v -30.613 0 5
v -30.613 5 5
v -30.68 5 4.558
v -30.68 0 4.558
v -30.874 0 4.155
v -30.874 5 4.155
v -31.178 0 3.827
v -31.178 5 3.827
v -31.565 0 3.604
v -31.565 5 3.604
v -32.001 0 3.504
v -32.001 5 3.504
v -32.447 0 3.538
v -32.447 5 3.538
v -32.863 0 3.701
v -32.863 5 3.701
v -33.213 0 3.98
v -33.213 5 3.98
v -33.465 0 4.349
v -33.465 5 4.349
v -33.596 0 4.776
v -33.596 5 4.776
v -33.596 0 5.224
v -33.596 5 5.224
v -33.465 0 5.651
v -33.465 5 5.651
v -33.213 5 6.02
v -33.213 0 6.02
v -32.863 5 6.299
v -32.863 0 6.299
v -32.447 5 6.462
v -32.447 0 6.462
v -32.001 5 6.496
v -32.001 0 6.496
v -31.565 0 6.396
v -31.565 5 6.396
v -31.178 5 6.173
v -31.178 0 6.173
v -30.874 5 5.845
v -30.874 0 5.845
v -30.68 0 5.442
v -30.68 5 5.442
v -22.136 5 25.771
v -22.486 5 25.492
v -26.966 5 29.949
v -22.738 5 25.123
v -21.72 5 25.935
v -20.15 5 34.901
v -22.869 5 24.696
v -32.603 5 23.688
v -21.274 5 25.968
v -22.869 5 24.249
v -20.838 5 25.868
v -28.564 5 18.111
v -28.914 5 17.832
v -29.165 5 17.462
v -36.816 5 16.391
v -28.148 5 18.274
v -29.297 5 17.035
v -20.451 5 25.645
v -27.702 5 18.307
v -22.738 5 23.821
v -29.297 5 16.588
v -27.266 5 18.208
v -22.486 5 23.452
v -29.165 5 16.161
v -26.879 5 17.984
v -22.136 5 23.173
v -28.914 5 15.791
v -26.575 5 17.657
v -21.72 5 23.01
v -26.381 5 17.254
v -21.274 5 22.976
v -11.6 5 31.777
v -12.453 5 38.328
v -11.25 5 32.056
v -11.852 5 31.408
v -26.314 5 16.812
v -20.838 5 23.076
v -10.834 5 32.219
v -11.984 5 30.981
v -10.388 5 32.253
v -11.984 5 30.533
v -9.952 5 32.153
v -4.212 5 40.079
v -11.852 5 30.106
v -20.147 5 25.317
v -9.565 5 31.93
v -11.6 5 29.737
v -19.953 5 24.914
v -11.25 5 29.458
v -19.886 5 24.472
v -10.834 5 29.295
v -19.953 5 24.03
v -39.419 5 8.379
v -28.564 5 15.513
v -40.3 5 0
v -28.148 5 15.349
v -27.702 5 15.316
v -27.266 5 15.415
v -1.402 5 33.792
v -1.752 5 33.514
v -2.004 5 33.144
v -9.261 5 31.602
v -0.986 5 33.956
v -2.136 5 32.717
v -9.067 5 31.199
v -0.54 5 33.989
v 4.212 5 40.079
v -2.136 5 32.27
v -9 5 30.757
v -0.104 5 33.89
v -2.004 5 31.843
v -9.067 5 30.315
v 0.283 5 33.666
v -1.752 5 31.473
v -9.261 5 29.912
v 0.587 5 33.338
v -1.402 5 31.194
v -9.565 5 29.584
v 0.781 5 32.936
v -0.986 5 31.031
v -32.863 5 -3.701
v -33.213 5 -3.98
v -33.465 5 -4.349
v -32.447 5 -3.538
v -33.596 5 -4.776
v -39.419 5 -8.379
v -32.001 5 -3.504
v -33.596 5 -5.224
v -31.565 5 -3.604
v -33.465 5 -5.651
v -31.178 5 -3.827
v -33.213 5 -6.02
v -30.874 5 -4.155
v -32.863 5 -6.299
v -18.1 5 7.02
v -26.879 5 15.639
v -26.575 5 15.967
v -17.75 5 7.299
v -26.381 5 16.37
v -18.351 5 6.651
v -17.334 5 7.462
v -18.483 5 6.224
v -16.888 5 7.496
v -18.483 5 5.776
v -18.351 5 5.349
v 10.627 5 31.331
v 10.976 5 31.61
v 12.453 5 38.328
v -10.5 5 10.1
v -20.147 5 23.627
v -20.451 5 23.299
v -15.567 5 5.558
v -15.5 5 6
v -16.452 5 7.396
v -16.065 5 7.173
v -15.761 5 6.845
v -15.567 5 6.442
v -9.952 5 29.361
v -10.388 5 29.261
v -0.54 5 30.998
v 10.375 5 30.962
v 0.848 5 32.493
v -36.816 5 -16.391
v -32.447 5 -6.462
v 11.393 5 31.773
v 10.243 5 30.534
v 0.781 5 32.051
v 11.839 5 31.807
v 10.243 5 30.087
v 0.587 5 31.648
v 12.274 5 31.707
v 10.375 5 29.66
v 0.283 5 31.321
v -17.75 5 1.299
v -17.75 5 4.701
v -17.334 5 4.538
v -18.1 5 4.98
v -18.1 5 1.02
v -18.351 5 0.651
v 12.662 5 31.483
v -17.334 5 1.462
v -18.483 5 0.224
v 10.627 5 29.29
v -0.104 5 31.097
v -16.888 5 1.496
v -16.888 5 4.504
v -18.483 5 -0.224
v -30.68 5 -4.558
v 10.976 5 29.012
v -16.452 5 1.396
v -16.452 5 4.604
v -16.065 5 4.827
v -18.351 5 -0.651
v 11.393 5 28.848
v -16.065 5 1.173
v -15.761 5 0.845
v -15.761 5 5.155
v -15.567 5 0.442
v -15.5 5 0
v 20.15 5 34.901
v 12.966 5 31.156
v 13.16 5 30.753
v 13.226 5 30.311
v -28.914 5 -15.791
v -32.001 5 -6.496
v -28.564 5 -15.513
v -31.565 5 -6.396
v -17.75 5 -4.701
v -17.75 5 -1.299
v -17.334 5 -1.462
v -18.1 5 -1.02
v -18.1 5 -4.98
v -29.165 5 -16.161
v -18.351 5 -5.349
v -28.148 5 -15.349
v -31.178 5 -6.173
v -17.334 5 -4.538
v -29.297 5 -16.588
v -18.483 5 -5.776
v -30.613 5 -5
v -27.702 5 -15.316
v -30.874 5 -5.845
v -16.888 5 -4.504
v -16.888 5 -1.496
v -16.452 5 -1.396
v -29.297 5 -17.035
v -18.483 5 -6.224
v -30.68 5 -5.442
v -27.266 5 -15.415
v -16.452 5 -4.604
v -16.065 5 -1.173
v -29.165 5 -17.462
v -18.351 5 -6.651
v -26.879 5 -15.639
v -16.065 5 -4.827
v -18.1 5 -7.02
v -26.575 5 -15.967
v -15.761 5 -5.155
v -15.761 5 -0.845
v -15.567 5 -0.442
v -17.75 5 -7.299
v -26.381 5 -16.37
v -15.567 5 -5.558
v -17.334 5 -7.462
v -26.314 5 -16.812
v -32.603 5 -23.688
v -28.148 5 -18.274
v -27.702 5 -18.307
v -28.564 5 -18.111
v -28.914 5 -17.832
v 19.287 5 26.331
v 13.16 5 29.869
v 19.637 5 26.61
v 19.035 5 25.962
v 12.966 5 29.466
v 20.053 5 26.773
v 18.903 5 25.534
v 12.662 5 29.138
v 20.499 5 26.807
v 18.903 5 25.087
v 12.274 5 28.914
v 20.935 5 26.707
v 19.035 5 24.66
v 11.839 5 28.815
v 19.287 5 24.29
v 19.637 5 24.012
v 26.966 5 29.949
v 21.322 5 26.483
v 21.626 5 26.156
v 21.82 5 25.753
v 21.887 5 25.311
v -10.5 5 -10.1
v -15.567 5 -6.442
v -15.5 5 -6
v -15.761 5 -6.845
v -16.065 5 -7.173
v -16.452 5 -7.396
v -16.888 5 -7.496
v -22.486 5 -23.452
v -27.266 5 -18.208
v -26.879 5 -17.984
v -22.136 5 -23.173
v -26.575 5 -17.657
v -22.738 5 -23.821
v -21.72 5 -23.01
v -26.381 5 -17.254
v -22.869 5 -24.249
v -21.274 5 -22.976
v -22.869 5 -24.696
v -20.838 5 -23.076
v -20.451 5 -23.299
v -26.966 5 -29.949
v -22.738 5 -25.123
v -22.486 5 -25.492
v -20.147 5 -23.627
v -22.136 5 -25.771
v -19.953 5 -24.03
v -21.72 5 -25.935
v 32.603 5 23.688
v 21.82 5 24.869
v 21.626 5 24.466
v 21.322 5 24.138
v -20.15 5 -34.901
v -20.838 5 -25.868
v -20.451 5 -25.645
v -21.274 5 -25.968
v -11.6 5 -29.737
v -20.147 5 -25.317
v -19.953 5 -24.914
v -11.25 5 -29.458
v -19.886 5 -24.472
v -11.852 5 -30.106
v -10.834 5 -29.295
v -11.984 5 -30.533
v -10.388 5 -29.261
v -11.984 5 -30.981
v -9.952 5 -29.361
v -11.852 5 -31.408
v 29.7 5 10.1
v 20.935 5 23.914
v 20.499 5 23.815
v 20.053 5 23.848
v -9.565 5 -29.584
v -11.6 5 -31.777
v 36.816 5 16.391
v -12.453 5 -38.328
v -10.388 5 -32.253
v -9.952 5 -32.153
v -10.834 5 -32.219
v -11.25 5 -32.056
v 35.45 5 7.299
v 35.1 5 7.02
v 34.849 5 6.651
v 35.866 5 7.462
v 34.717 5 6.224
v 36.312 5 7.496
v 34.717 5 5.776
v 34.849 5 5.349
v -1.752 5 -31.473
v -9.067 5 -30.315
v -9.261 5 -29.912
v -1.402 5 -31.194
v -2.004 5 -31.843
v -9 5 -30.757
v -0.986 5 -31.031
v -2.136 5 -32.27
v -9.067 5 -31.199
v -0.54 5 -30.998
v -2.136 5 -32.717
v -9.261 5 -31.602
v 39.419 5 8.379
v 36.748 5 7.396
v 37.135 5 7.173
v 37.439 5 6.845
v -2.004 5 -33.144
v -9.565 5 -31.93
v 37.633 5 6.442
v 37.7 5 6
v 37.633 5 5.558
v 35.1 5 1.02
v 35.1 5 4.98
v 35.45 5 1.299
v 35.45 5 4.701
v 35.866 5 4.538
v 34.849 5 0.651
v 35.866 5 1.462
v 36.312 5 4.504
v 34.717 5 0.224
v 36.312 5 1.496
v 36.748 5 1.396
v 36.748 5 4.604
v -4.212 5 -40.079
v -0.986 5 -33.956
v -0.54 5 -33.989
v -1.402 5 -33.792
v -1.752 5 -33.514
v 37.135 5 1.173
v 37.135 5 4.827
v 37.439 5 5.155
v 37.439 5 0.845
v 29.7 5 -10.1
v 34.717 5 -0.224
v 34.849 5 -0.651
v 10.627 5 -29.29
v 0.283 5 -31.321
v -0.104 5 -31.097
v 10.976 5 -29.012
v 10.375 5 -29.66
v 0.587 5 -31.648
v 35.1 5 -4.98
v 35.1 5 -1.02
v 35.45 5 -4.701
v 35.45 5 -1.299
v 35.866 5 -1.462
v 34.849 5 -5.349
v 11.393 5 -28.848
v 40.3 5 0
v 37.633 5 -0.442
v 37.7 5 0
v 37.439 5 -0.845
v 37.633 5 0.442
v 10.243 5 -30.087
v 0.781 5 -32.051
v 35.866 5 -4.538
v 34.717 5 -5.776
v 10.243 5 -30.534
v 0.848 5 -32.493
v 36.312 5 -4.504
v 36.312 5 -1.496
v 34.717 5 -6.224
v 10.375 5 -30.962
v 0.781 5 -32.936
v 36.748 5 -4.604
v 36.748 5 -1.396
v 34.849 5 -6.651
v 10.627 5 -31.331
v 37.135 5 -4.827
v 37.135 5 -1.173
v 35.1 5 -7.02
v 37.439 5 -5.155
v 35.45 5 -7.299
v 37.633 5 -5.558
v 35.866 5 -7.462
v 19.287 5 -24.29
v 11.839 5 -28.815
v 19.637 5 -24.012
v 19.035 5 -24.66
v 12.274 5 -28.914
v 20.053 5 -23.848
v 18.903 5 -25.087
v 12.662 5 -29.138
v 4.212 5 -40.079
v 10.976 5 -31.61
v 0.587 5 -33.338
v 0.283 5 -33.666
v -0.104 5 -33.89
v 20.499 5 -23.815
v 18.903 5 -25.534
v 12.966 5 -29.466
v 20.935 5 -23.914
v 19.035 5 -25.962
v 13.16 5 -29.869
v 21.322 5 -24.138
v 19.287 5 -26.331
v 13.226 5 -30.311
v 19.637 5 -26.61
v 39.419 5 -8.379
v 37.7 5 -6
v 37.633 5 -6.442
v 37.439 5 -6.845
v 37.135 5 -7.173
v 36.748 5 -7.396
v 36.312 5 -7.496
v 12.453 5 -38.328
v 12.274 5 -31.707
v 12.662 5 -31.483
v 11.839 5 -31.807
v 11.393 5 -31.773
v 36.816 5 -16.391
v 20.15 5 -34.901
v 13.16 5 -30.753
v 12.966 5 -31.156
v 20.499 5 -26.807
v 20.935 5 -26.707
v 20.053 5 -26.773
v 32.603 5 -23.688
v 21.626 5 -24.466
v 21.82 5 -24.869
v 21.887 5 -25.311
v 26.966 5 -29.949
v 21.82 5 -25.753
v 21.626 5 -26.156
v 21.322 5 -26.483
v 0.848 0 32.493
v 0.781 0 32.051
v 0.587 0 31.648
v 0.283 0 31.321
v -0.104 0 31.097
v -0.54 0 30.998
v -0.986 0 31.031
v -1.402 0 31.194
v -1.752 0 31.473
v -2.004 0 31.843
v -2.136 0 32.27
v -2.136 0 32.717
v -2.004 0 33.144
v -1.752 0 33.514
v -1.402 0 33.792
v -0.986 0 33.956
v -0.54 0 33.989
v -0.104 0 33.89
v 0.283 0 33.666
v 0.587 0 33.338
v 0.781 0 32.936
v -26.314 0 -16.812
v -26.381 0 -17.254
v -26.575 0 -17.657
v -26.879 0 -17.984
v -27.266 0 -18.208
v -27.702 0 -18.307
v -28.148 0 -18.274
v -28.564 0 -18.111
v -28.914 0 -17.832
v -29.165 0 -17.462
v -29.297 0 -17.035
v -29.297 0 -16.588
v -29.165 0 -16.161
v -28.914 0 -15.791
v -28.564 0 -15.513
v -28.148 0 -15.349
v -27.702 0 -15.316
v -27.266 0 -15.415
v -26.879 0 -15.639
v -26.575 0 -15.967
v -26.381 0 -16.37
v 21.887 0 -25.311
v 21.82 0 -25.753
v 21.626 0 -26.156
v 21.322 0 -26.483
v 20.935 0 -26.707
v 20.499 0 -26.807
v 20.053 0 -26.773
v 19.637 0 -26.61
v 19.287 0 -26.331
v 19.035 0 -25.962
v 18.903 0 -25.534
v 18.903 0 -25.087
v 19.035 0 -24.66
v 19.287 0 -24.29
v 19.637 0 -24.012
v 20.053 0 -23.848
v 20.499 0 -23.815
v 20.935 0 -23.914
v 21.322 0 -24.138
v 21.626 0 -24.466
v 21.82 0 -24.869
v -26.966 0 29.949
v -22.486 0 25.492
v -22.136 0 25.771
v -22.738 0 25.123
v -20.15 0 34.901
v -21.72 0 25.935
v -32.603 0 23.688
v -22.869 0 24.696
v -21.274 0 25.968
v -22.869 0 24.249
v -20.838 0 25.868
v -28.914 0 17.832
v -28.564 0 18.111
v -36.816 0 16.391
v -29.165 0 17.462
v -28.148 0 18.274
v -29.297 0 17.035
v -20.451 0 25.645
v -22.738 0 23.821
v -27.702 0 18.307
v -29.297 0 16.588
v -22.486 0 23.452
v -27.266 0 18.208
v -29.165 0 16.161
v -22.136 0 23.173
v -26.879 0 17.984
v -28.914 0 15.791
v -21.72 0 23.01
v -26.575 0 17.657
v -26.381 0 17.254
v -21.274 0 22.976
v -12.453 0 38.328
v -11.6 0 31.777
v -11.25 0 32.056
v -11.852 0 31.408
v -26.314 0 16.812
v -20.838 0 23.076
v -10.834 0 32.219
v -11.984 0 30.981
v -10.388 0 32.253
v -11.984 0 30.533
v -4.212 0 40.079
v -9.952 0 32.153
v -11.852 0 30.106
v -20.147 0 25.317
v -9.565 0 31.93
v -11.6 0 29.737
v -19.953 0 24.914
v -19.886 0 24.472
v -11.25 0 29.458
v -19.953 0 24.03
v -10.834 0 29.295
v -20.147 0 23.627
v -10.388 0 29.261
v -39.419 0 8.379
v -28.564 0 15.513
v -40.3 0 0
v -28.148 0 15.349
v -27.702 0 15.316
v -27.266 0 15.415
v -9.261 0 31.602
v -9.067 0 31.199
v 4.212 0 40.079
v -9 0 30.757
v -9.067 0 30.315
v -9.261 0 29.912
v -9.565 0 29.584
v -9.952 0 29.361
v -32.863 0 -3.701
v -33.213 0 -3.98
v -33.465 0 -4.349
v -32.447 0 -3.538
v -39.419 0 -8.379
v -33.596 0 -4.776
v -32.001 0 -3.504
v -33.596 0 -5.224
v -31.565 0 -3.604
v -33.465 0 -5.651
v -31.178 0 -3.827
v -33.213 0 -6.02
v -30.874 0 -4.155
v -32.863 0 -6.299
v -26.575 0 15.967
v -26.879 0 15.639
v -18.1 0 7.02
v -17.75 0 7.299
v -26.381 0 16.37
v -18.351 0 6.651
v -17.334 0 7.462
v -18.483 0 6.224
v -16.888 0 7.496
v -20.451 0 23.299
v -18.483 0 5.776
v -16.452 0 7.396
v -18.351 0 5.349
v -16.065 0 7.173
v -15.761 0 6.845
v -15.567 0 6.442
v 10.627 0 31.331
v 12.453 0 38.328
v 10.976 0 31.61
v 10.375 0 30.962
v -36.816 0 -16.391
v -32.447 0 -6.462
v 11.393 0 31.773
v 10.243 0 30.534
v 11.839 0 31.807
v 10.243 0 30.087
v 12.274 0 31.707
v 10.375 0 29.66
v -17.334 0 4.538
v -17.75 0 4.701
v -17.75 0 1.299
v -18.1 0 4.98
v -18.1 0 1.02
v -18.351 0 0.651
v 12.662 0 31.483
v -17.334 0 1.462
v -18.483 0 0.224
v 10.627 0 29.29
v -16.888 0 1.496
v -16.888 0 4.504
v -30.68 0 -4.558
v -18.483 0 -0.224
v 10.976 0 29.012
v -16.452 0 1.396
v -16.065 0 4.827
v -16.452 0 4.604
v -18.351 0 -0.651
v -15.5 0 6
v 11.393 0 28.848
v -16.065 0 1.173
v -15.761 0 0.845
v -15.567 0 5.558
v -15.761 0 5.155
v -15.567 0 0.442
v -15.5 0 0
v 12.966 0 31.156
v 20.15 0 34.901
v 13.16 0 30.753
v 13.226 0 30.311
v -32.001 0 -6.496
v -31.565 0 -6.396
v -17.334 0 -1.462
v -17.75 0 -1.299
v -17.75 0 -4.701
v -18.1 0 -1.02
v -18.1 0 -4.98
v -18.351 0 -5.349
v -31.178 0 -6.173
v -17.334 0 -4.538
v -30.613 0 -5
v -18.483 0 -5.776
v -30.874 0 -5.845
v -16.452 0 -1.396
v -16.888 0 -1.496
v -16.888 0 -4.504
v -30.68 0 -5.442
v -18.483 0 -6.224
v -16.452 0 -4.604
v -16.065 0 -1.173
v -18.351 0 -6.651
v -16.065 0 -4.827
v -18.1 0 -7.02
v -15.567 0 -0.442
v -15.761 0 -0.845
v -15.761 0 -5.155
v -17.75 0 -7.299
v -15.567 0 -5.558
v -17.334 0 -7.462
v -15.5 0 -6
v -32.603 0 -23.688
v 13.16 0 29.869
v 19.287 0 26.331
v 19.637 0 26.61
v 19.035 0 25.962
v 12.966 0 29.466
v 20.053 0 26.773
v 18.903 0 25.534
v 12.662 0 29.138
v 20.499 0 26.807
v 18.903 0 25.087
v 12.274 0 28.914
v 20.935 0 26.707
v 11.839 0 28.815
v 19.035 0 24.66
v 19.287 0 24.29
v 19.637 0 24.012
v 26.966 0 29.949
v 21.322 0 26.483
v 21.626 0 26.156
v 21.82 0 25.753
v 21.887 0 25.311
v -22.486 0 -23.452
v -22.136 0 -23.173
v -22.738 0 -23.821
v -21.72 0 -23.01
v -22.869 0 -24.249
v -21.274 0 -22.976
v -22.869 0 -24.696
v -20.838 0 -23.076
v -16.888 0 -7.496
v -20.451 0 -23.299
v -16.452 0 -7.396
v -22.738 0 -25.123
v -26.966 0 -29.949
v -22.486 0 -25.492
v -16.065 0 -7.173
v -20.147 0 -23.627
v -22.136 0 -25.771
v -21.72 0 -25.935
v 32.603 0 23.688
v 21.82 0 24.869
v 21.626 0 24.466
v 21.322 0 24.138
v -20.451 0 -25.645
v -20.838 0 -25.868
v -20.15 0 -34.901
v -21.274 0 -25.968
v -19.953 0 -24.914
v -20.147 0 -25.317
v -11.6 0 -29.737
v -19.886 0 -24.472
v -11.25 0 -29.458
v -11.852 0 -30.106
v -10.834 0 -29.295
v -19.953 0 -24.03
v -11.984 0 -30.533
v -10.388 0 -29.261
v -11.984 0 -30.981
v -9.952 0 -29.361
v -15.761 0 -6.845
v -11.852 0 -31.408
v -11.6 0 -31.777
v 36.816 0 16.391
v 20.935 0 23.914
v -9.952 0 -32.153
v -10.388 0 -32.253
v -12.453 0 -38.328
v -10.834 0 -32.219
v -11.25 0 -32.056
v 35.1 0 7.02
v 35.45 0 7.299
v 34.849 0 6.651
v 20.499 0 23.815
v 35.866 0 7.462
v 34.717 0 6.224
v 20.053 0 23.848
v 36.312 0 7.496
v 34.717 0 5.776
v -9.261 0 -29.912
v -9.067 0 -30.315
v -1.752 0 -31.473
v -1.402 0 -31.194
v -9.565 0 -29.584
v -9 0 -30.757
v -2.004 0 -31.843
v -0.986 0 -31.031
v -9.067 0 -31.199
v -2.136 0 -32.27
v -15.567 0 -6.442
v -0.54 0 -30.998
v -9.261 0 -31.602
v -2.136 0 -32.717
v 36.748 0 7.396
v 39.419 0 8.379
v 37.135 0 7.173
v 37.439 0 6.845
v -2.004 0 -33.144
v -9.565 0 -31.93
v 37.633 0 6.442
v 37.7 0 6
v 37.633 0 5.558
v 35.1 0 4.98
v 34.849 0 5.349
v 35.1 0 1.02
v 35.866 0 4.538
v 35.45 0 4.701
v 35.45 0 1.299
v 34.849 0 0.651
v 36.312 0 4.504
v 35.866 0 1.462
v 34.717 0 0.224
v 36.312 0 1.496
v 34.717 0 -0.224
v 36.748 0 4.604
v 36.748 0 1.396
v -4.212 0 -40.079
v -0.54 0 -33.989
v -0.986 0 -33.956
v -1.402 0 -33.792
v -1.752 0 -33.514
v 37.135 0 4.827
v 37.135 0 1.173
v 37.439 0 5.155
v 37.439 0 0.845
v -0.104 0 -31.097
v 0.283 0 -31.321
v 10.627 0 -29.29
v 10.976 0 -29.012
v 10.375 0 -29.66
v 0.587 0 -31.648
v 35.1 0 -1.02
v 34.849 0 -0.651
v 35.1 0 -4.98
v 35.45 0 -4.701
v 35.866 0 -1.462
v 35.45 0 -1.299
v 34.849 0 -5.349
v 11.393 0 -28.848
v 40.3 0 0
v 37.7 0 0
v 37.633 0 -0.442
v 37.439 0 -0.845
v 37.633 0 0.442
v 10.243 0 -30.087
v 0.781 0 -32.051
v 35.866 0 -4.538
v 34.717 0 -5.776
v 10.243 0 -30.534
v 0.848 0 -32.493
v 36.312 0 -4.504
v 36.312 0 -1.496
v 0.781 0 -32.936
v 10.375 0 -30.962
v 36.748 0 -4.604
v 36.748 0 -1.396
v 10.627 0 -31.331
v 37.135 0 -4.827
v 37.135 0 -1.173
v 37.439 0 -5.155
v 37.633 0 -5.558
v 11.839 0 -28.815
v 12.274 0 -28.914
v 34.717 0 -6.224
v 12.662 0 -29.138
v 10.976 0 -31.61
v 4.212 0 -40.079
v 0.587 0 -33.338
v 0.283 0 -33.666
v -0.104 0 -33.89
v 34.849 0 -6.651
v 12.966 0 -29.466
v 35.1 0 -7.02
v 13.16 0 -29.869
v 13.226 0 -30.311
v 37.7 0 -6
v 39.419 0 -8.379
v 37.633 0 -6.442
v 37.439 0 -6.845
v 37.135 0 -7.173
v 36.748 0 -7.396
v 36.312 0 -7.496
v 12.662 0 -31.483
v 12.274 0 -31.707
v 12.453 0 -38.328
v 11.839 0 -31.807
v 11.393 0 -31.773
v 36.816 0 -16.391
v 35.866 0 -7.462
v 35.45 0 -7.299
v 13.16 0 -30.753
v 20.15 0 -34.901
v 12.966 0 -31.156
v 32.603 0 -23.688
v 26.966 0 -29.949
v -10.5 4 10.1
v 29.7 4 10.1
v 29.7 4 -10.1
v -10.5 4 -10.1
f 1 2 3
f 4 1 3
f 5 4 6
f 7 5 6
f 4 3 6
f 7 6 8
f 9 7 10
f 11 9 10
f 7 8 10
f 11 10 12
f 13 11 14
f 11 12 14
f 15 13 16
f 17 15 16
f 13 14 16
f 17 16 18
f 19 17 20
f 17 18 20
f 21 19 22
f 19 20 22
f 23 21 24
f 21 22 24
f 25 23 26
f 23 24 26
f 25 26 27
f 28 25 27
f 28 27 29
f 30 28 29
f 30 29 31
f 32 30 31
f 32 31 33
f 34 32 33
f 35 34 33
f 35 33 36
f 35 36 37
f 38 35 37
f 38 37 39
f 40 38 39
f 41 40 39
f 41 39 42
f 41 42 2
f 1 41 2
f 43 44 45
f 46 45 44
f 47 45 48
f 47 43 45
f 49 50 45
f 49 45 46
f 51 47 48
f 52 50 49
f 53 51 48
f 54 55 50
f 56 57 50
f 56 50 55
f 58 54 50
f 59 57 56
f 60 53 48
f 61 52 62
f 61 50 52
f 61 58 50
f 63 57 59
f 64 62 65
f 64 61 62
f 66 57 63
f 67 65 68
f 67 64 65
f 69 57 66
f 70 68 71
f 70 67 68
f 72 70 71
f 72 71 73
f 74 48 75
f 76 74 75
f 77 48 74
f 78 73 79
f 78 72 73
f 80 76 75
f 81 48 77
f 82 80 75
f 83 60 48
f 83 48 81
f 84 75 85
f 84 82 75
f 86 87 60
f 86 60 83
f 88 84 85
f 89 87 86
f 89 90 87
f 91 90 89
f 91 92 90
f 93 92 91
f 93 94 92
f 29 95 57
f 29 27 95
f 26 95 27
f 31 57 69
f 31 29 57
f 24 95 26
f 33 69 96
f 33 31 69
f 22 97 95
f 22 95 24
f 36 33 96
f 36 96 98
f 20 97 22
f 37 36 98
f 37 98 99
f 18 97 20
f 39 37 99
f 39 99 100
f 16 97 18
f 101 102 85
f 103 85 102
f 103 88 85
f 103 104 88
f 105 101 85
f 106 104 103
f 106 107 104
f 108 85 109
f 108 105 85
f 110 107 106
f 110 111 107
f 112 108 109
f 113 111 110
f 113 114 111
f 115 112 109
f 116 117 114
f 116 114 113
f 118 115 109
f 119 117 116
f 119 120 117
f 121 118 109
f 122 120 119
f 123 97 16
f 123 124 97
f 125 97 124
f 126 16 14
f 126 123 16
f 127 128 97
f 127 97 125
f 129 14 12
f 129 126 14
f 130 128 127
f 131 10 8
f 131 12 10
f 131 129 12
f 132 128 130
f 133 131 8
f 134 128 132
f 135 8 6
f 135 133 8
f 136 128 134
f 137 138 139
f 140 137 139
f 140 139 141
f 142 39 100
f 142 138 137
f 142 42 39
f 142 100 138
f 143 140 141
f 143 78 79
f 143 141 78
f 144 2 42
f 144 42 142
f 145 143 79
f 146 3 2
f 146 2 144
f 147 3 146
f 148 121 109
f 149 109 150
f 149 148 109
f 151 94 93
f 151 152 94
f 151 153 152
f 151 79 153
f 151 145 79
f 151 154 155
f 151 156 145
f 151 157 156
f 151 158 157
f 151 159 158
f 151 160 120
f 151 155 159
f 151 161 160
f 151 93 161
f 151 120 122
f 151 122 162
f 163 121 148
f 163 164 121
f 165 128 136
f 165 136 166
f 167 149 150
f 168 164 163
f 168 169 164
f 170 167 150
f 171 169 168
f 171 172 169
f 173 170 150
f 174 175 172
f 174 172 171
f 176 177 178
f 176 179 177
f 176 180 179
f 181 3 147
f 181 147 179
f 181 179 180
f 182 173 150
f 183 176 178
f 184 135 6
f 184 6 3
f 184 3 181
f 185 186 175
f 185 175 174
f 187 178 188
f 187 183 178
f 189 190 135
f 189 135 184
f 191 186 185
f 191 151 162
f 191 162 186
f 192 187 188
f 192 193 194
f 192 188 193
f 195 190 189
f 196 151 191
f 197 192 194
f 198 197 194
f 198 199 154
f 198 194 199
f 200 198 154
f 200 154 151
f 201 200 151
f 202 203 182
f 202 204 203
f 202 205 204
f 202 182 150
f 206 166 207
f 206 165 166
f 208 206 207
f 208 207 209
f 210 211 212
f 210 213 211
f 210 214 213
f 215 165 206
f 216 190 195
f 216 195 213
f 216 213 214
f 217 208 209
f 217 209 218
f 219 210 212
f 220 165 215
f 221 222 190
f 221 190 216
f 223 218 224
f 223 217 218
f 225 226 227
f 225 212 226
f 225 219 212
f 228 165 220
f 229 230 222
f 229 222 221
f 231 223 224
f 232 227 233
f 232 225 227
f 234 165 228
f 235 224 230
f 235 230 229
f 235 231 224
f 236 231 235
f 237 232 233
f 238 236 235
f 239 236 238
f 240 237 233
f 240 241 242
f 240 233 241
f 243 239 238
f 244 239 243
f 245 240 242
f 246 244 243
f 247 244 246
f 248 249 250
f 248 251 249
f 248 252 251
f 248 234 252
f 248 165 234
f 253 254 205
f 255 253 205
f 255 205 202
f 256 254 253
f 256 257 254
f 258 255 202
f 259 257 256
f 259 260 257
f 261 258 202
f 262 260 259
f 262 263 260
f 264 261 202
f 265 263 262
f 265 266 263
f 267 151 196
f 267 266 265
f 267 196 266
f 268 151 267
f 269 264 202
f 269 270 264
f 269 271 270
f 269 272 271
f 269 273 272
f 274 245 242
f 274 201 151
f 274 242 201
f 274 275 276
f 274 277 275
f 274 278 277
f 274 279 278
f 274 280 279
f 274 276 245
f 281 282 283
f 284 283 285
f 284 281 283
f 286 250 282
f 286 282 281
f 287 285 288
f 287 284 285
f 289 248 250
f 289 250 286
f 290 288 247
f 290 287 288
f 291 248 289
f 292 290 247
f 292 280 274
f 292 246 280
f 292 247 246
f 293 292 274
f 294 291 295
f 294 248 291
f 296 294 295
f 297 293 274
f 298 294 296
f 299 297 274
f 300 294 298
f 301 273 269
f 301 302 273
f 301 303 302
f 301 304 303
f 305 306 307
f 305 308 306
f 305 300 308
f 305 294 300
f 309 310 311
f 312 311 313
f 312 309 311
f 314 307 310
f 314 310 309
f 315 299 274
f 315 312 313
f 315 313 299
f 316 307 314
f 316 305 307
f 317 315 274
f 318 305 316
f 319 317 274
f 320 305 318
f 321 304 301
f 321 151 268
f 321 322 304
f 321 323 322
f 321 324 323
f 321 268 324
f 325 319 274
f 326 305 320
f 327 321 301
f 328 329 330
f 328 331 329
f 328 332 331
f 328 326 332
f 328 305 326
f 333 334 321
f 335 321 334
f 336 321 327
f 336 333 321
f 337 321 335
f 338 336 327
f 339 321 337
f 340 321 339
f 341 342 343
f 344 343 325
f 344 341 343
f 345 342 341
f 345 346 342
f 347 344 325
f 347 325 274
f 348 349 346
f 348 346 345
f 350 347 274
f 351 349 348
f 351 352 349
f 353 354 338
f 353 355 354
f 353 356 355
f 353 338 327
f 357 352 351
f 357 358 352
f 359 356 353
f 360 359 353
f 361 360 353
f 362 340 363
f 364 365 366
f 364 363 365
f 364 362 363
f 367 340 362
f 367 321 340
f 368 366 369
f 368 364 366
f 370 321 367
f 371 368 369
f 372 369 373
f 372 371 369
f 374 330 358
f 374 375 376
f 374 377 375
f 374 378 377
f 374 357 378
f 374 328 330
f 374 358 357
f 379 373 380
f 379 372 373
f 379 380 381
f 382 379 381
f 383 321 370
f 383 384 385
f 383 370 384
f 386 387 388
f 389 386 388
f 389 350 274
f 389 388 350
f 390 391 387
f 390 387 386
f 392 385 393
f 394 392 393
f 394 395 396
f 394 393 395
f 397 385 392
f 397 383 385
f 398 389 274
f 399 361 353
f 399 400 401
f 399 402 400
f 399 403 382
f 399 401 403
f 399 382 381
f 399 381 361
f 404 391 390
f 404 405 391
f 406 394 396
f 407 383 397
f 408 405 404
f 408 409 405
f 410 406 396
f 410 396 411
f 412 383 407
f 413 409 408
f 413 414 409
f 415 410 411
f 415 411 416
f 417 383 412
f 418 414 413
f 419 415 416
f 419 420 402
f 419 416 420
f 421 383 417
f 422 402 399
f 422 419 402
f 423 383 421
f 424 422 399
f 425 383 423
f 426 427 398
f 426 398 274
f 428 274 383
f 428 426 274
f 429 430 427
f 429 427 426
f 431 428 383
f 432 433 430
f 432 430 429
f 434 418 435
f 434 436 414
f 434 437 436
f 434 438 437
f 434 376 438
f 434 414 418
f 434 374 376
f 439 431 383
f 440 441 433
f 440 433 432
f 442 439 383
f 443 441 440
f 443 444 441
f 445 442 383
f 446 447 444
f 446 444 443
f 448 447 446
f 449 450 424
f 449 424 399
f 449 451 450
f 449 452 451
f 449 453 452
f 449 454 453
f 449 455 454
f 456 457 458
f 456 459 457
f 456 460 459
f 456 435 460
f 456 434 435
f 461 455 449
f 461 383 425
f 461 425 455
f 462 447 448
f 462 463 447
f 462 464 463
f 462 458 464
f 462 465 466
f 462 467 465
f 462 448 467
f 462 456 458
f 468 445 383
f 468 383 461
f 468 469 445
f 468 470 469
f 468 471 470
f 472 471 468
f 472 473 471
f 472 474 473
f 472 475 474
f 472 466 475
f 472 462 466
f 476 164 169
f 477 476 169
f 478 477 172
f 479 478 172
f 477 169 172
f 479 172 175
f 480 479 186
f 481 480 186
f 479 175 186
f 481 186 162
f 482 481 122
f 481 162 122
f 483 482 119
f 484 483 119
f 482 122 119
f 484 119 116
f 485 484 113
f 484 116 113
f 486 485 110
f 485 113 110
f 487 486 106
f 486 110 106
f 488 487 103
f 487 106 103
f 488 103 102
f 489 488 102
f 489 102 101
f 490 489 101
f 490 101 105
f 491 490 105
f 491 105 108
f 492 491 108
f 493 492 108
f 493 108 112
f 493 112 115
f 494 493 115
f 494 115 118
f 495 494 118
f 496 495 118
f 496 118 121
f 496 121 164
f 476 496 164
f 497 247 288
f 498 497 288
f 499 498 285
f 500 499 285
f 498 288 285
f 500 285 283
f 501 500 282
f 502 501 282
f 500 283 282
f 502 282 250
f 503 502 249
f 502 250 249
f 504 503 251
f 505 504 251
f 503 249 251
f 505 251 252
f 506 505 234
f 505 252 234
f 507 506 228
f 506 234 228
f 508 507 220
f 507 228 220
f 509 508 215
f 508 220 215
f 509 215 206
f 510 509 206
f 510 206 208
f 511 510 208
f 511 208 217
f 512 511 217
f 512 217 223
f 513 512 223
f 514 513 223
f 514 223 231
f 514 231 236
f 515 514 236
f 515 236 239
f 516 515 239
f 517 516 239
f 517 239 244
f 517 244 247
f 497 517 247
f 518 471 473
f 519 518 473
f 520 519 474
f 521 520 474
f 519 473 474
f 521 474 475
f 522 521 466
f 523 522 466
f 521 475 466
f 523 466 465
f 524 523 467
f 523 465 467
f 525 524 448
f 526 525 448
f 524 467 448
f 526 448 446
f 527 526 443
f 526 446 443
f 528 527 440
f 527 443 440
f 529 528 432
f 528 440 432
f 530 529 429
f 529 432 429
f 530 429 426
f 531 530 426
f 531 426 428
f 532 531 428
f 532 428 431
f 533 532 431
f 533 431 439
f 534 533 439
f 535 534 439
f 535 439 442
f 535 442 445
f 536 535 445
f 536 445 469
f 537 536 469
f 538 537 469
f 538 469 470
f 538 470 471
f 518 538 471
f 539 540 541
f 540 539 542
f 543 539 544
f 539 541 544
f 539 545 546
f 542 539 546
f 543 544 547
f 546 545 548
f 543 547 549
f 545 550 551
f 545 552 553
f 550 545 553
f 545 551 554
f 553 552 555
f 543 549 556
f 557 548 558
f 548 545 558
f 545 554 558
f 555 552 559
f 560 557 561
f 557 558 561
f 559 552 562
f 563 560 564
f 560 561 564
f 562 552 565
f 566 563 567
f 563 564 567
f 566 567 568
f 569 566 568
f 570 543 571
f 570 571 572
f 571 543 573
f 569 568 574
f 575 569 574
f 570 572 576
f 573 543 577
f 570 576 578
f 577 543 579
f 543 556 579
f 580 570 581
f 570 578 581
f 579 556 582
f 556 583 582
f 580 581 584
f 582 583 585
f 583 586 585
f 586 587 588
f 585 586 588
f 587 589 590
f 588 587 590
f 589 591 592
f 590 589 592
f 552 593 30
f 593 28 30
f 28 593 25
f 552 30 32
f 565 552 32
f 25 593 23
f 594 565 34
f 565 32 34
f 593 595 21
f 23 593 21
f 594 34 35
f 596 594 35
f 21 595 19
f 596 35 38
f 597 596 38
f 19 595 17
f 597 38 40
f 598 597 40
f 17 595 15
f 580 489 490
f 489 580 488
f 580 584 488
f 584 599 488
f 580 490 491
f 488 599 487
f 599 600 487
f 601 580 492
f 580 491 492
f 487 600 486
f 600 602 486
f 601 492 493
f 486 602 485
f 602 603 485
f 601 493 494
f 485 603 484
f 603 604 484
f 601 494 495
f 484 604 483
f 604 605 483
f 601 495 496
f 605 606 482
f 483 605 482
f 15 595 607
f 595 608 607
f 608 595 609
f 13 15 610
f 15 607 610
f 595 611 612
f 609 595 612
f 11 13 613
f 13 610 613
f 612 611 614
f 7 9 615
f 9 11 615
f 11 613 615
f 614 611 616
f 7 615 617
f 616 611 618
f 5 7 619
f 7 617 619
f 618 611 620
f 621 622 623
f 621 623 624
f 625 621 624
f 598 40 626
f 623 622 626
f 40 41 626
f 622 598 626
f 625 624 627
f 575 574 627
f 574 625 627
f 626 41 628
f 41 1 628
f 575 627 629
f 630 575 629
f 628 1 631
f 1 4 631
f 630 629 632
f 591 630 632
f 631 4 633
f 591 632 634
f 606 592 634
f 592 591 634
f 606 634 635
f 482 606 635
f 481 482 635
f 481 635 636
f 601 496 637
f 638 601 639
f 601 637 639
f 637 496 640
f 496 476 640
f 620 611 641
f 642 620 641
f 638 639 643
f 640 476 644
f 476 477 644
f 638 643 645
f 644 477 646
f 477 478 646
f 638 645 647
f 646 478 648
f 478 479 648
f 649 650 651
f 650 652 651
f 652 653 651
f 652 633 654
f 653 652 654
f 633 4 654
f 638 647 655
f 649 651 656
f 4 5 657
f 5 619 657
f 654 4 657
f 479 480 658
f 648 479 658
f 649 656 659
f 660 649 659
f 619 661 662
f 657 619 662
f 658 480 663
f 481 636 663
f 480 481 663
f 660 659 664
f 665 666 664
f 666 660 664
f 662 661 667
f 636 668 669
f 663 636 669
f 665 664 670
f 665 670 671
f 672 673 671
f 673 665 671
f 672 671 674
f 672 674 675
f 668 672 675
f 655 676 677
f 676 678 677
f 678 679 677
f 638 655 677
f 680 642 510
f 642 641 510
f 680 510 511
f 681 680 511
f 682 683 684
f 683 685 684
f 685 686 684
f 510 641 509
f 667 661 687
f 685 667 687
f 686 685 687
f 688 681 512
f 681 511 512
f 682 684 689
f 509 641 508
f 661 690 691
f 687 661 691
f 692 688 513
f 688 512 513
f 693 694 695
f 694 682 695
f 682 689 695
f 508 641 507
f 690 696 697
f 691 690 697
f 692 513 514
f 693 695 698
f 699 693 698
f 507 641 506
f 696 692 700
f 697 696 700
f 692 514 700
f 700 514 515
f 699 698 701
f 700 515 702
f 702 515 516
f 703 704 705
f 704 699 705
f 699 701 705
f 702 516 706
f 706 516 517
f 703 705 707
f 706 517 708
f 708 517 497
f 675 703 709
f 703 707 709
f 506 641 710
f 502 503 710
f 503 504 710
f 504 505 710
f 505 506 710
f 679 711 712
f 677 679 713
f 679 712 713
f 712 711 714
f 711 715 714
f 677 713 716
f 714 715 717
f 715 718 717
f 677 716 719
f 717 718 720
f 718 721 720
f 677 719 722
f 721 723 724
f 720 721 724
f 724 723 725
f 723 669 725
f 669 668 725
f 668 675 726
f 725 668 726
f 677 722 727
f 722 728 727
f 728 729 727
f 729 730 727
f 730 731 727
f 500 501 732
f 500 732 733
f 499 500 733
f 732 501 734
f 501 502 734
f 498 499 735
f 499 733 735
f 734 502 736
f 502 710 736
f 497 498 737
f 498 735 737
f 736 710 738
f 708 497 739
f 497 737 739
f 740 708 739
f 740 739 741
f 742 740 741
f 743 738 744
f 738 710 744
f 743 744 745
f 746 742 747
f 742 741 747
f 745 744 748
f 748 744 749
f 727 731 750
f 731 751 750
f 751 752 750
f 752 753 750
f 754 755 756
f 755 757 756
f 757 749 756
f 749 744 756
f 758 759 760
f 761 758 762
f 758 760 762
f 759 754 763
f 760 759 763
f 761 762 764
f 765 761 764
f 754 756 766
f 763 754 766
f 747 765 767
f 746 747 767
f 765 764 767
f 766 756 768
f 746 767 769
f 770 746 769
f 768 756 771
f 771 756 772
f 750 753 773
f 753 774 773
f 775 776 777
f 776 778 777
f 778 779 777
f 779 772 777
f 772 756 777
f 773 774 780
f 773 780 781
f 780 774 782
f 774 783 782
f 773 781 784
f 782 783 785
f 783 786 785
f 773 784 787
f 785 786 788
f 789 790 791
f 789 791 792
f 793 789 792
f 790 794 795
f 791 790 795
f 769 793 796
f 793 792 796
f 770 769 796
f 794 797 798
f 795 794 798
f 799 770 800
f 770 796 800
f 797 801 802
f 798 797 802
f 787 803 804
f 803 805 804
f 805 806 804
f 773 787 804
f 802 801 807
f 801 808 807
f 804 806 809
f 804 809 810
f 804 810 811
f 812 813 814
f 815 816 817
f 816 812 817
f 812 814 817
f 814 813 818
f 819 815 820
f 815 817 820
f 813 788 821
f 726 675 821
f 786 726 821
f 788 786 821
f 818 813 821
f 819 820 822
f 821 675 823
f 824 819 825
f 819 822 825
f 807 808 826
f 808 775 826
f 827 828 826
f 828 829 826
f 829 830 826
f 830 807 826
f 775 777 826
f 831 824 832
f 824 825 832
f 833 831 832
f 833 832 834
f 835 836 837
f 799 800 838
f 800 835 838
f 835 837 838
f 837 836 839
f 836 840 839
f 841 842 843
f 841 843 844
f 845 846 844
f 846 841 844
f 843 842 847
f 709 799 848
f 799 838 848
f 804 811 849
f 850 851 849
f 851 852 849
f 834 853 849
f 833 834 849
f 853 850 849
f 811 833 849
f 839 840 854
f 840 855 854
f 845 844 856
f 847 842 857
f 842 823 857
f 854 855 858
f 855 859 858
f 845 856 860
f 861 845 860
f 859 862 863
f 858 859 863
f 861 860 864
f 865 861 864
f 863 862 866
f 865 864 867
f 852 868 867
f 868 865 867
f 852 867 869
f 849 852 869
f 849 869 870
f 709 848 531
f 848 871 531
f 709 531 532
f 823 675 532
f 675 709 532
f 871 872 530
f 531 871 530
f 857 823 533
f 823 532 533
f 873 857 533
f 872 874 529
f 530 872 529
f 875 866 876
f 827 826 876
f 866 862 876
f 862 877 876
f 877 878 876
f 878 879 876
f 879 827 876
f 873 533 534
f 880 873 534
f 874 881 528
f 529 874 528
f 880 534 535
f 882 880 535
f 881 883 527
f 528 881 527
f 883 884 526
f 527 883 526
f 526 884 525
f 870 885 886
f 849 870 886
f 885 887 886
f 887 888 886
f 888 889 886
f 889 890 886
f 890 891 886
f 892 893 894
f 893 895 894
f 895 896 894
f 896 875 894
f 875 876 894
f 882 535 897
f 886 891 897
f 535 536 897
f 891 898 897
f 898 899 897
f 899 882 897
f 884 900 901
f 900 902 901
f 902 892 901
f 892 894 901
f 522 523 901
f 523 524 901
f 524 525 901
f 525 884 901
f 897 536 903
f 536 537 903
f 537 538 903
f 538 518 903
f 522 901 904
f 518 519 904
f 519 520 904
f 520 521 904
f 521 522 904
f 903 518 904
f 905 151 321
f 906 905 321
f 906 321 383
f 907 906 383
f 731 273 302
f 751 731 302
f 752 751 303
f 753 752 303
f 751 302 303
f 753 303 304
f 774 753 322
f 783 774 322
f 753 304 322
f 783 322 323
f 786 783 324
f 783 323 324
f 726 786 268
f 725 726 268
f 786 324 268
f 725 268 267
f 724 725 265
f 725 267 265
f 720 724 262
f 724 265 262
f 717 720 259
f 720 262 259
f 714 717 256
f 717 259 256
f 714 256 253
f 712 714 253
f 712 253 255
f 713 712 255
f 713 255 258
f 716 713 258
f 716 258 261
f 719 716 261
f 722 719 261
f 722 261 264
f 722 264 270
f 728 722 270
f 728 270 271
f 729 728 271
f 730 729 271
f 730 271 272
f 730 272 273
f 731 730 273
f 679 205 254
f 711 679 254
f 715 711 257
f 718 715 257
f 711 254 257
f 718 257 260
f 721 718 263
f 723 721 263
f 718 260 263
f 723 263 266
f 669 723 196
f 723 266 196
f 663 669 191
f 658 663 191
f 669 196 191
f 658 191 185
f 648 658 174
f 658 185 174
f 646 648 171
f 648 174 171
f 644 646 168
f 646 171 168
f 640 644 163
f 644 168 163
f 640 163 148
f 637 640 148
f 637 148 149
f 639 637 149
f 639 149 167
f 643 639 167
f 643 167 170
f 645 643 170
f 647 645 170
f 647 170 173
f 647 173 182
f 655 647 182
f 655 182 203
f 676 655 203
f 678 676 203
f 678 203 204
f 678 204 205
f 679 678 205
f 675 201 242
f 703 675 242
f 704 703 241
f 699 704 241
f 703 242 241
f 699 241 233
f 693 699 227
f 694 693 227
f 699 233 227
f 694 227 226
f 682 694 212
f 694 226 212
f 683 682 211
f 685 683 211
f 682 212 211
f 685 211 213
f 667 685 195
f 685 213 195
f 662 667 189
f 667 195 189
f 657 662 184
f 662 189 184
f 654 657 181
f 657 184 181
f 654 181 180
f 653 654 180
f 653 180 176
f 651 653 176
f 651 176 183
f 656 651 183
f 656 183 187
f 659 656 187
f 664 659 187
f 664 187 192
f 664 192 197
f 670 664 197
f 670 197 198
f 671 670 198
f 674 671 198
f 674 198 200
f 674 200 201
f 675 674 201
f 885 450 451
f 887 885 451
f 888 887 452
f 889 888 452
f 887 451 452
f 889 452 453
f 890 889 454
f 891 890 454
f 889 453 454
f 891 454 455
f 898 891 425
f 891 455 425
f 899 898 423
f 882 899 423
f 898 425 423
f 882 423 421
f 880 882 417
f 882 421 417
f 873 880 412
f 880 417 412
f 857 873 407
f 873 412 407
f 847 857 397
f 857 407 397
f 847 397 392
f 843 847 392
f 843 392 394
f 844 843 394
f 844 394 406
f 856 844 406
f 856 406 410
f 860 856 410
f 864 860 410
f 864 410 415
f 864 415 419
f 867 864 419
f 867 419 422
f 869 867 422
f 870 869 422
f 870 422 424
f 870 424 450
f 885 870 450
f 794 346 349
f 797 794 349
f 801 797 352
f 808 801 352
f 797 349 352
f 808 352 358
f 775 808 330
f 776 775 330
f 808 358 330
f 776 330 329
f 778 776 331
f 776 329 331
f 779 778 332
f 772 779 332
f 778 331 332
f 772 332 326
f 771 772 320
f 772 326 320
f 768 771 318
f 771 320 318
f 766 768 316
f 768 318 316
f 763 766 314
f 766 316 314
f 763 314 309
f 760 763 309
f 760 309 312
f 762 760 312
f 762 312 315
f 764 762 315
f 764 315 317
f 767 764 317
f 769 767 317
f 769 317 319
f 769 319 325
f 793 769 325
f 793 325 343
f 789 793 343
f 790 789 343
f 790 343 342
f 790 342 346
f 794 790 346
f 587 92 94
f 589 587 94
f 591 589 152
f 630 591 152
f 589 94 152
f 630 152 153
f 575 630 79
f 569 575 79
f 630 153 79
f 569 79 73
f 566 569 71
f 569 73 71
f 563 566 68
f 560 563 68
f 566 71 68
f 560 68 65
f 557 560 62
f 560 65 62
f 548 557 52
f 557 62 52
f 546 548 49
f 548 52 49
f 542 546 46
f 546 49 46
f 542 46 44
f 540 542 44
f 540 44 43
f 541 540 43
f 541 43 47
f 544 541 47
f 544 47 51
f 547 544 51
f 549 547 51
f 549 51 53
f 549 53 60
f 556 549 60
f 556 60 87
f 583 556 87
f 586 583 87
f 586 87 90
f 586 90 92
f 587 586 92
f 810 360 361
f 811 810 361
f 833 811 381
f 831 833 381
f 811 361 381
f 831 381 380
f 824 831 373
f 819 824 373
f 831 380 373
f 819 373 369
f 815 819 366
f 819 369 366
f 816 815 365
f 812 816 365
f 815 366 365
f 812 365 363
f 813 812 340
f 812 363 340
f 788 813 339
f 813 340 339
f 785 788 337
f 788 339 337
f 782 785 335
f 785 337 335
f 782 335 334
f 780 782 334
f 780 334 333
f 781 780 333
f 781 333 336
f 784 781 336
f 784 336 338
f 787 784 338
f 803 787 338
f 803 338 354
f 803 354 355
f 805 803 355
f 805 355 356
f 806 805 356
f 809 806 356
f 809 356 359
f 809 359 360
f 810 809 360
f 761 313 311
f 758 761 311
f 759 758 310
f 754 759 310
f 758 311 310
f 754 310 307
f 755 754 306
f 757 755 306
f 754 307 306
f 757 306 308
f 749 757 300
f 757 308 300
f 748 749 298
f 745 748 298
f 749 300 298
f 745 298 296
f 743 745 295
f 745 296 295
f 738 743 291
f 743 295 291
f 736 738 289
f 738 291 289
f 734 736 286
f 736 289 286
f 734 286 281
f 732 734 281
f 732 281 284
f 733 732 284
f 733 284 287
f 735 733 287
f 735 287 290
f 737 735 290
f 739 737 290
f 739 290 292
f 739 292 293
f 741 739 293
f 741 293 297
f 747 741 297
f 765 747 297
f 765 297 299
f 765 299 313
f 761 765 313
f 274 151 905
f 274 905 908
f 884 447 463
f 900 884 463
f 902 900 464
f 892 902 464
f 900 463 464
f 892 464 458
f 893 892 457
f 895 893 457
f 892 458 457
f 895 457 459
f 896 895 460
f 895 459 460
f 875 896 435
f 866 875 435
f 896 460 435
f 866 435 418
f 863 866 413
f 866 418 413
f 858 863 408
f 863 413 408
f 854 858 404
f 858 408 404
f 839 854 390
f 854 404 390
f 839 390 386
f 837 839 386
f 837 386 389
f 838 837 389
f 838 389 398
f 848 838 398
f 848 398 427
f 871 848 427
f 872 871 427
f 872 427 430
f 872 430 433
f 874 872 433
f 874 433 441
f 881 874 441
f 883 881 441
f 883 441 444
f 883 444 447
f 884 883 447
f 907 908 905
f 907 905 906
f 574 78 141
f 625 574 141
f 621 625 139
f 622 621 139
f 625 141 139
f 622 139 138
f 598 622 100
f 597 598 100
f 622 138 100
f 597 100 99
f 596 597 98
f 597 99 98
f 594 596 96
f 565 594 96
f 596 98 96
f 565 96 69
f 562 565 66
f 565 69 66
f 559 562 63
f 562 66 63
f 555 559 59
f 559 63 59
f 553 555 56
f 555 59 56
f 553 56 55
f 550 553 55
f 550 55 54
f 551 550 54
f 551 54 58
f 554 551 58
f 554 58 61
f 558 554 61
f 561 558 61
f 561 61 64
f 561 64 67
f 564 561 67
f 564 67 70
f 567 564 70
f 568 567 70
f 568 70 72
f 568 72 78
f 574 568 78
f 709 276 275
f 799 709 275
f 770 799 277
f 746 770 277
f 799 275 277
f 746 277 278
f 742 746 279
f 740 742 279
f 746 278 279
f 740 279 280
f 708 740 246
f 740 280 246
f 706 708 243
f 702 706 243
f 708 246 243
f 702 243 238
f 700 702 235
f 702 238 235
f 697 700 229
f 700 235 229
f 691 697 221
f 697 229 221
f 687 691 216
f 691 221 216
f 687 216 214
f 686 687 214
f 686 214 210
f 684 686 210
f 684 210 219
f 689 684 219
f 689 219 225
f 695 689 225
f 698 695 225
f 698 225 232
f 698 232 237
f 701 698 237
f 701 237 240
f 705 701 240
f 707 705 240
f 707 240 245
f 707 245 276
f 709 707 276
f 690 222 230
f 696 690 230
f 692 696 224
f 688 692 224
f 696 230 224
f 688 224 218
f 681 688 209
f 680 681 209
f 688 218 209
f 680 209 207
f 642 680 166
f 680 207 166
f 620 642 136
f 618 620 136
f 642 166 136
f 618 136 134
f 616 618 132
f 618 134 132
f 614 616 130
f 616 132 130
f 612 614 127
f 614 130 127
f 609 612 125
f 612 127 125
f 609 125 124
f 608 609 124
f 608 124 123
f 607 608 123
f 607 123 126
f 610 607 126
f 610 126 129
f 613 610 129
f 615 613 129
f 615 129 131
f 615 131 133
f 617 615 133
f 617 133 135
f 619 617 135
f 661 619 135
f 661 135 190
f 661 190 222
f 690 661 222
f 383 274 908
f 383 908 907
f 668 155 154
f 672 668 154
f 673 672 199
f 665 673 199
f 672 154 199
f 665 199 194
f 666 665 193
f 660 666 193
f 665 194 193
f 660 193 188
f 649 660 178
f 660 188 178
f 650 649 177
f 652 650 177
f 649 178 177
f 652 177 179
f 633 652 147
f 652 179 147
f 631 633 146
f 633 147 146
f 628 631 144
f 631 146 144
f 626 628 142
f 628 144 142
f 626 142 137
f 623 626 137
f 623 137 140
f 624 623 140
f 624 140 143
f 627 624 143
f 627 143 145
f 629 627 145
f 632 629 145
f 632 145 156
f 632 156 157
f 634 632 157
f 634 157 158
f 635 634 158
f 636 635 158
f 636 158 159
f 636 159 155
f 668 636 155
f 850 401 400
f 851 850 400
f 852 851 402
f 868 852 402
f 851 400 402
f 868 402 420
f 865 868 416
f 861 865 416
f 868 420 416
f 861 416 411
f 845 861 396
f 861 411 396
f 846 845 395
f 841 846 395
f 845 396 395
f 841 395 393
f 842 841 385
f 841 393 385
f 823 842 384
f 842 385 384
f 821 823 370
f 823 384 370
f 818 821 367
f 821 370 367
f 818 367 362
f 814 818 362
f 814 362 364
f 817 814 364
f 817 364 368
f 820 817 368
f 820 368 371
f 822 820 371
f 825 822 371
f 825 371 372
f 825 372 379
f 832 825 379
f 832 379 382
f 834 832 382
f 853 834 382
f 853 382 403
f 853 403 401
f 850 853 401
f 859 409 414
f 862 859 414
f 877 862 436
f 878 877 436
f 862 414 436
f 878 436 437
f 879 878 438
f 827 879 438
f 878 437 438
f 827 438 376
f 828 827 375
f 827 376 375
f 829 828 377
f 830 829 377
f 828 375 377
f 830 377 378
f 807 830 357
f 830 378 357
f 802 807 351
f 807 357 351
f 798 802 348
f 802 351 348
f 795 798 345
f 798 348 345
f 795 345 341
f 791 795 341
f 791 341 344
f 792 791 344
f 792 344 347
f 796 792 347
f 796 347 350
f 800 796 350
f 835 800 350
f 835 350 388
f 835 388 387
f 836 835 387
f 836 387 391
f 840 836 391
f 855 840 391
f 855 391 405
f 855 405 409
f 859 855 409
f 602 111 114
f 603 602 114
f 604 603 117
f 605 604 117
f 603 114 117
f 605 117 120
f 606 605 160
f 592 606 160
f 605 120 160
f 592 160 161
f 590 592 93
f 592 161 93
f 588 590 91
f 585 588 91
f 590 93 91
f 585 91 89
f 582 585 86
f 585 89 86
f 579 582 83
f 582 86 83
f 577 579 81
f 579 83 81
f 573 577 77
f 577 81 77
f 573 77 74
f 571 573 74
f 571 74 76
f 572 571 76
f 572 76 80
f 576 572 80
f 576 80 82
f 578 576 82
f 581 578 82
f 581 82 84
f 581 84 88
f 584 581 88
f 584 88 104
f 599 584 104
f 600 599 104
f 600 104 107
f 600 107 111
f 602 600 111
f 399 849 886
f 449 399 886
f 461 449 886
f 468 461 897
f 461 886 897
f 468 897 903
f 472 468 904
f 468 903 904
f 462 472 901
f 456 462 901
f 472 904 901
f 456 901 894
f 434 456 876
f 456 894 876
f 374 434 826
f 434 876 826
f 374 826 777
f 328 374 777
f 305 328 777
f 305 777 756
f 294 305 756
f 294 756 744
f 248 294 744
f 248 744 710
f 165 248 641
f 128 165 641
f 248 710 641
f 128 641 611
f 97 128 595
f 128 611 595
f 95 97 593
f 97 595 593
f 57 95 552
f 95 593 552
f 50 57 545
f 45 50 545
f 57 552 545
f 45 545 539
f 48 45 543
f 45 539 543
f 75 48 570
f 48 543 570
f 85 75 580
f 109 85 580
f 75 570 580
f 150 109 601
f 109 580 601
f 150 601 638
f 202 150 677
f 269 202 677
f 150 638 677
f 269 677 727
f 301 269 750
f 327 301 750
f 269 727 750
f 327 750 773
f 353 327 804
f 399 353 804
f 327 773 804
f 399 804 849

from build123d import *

# Parameters (mm, degrees)
SKETCH1_R           = 40.3
BOSS_EXTRUDE1_DEPTH = 5
SKETCH2_W           = 40.2
SKETCH2_H           = 20.2
CUT_EXTRUDE3_DEPTH  = 1
SKETCH3_R           = 1.5
CUT_EXTRUDE4_DEPTH  = 6
CUT_EXTRUDE5_REACH  = 7
SKETCH4_R           = 1.5
SKETCH5_R           = 1.5
CUT_EXTRUDE6_DEPTH  = 6


with BuildPart() as part:
    # Sketch1 → Boss-Extrude1 (new body)
    with BuildSketch(Plane(origin=(0, 0, 0), x_dir=(1, 0, 0), z_dir=(0, 1, 0))):
        Circle(SKETCH1_R)
    extrude(amount=BOSS_EXTRUDE1_DEPTH)

    # Sketch2 → Cut-Extrude3 (cut)
    with BuildSketch(Plane(origin=(0, 5, 0), x_dir=(1, 0, 0), z_dir=(0, 1, 0))):
        with Locations((9.6, 0)):
            Rectangle(SKETCH2_W, SKETCH2_H)
    extrude(amount=-CUT_EXTRUDE3_DEPTH, mode=Mode.SUBTRACT)

    # Sketch3 → Cut-Extrude4 (cut, through all)
    with BuildSketch(Plane(origin=(0, 5, 0), x_dir=(1, 0, 0), z_dir=(0, 1, 0))):
        with Locations((-17, -6)):
            Circle(SKETCH3_R)
        with Locations((-17, 0)):
            Circle(SKETCH3_R)
        with Locations((-17, 6)):
            Circle(SKETCH3_R)
        with Locations((36.2, -6)):
            Circle(SKETCH3_R)
        with Locations((36.2, 0)):
            Circle(SKETCH3_R)
        with Locations((36.2, 6)):
            Circle(SKETCH3_R)
    extrude(amount=-CUT_EXTRUDE4_DEPTH, mode=Mode.SUBTRACT)

    # Sketch4 → Cut-Extrude5 (cut, up to next)
    with BuildSketch(Plane(origin=(0, 5, 0), x_dir=(1, 0, 0), z_dir=(0, 1, 0)), mode=Mode.PRIVATE) as cut_extrude5_sk1:
        with Locations((-32.113081447, 5)):
            Circle(SKETCH4_R)
    cut_extrude5_tool1 = extrude(cut_extrude5_sk1.sketch, amount=-CUT_EXTRUDE5_REACH, mode=Mode.PRIVATE) & part.part
    add(cut_extrude5_tool1.solids().sort_by_distance((-32.113081, 5, -5))[0], mode=Mode.SUBTRACT)
    # Sketch4 → Cut-Extrude5 (cut, up to next)
    with BuildSketch(Plane(origin=(0, 5, 0), x_dir=(1, 0, 0), z_dir=(0, 1, 0)), mode=Mode.PRIVATE) as cut_extrude5_sk2:
        with Locations((-32.113081447, -5)):
            Circle(SKETCH4_R)
    cut_extrude5_tool2 = extrude(cut_extrude5_sk2.sketch, amount=-CUT_EXTRUDE5_REACH, mode=Mode.PRIVATE) & part.part
    add(cut_extrude5_tool2.solids().sort_by_distance((-32.113081, 5, 5))[0], mode=Mode.SUBTRACT)

    # Sketch5 → Cut-Extrude6 (cut, through all)
    with BuildSketch(Plane(origin=(0, 5, 0), x_dir=(1, 0, 0), z_dir=(0, 1, 0))):
        with Locations((-32.113081447, 5)):
            Circle(SKETCH5_R)
        with Locations((-32.113081447, -5)):
            Circle(SKETCH5_R)
        with Locations((-21.386109545, 24.472113078)):
            Circle(SKETCH5_R)
        with Locations((-27.813985642, 16.811668647)):
            Circle(SKETCH5_R)
        with Locations((-0.652339307, 32.49345247)):
            Circle(SKETCH5_R)
        with Locations((-10.500416838, 30.756970693)):
            Circle(SKETCH5_R)
        with Locations((20.386667742, 25.310744327)):
            Circle(SKETCH5_R)
        with Locations((11.726413704, 30.310744327)):
            Circle(SKETCH5_R)
        with Locations((-27.813985642, -16.811668647)):
            Circle(SKETCH5_R)
        with Locations((-21.386109545, -24.472113078)):
            Circle(SKETCH5_R)
        with Locations((-10.500416838, -30.756970693)):
            Circle(SKETCH5_R)
        with Locations((-0.652339307, -32.49345247)):
            Circle(SKETCH5_R)
        with Locations((11.726413704, -30.310744327)):
            Circle(SKETCH5_R)
        with Locations((20.386667742, -25.310744327)):
            Circle(SKETCH5_R)
    extrude(amount=-CUT_EXTRUDE6_DEPTH, mode=Mode.SUBTRACT)


solid = part.part
